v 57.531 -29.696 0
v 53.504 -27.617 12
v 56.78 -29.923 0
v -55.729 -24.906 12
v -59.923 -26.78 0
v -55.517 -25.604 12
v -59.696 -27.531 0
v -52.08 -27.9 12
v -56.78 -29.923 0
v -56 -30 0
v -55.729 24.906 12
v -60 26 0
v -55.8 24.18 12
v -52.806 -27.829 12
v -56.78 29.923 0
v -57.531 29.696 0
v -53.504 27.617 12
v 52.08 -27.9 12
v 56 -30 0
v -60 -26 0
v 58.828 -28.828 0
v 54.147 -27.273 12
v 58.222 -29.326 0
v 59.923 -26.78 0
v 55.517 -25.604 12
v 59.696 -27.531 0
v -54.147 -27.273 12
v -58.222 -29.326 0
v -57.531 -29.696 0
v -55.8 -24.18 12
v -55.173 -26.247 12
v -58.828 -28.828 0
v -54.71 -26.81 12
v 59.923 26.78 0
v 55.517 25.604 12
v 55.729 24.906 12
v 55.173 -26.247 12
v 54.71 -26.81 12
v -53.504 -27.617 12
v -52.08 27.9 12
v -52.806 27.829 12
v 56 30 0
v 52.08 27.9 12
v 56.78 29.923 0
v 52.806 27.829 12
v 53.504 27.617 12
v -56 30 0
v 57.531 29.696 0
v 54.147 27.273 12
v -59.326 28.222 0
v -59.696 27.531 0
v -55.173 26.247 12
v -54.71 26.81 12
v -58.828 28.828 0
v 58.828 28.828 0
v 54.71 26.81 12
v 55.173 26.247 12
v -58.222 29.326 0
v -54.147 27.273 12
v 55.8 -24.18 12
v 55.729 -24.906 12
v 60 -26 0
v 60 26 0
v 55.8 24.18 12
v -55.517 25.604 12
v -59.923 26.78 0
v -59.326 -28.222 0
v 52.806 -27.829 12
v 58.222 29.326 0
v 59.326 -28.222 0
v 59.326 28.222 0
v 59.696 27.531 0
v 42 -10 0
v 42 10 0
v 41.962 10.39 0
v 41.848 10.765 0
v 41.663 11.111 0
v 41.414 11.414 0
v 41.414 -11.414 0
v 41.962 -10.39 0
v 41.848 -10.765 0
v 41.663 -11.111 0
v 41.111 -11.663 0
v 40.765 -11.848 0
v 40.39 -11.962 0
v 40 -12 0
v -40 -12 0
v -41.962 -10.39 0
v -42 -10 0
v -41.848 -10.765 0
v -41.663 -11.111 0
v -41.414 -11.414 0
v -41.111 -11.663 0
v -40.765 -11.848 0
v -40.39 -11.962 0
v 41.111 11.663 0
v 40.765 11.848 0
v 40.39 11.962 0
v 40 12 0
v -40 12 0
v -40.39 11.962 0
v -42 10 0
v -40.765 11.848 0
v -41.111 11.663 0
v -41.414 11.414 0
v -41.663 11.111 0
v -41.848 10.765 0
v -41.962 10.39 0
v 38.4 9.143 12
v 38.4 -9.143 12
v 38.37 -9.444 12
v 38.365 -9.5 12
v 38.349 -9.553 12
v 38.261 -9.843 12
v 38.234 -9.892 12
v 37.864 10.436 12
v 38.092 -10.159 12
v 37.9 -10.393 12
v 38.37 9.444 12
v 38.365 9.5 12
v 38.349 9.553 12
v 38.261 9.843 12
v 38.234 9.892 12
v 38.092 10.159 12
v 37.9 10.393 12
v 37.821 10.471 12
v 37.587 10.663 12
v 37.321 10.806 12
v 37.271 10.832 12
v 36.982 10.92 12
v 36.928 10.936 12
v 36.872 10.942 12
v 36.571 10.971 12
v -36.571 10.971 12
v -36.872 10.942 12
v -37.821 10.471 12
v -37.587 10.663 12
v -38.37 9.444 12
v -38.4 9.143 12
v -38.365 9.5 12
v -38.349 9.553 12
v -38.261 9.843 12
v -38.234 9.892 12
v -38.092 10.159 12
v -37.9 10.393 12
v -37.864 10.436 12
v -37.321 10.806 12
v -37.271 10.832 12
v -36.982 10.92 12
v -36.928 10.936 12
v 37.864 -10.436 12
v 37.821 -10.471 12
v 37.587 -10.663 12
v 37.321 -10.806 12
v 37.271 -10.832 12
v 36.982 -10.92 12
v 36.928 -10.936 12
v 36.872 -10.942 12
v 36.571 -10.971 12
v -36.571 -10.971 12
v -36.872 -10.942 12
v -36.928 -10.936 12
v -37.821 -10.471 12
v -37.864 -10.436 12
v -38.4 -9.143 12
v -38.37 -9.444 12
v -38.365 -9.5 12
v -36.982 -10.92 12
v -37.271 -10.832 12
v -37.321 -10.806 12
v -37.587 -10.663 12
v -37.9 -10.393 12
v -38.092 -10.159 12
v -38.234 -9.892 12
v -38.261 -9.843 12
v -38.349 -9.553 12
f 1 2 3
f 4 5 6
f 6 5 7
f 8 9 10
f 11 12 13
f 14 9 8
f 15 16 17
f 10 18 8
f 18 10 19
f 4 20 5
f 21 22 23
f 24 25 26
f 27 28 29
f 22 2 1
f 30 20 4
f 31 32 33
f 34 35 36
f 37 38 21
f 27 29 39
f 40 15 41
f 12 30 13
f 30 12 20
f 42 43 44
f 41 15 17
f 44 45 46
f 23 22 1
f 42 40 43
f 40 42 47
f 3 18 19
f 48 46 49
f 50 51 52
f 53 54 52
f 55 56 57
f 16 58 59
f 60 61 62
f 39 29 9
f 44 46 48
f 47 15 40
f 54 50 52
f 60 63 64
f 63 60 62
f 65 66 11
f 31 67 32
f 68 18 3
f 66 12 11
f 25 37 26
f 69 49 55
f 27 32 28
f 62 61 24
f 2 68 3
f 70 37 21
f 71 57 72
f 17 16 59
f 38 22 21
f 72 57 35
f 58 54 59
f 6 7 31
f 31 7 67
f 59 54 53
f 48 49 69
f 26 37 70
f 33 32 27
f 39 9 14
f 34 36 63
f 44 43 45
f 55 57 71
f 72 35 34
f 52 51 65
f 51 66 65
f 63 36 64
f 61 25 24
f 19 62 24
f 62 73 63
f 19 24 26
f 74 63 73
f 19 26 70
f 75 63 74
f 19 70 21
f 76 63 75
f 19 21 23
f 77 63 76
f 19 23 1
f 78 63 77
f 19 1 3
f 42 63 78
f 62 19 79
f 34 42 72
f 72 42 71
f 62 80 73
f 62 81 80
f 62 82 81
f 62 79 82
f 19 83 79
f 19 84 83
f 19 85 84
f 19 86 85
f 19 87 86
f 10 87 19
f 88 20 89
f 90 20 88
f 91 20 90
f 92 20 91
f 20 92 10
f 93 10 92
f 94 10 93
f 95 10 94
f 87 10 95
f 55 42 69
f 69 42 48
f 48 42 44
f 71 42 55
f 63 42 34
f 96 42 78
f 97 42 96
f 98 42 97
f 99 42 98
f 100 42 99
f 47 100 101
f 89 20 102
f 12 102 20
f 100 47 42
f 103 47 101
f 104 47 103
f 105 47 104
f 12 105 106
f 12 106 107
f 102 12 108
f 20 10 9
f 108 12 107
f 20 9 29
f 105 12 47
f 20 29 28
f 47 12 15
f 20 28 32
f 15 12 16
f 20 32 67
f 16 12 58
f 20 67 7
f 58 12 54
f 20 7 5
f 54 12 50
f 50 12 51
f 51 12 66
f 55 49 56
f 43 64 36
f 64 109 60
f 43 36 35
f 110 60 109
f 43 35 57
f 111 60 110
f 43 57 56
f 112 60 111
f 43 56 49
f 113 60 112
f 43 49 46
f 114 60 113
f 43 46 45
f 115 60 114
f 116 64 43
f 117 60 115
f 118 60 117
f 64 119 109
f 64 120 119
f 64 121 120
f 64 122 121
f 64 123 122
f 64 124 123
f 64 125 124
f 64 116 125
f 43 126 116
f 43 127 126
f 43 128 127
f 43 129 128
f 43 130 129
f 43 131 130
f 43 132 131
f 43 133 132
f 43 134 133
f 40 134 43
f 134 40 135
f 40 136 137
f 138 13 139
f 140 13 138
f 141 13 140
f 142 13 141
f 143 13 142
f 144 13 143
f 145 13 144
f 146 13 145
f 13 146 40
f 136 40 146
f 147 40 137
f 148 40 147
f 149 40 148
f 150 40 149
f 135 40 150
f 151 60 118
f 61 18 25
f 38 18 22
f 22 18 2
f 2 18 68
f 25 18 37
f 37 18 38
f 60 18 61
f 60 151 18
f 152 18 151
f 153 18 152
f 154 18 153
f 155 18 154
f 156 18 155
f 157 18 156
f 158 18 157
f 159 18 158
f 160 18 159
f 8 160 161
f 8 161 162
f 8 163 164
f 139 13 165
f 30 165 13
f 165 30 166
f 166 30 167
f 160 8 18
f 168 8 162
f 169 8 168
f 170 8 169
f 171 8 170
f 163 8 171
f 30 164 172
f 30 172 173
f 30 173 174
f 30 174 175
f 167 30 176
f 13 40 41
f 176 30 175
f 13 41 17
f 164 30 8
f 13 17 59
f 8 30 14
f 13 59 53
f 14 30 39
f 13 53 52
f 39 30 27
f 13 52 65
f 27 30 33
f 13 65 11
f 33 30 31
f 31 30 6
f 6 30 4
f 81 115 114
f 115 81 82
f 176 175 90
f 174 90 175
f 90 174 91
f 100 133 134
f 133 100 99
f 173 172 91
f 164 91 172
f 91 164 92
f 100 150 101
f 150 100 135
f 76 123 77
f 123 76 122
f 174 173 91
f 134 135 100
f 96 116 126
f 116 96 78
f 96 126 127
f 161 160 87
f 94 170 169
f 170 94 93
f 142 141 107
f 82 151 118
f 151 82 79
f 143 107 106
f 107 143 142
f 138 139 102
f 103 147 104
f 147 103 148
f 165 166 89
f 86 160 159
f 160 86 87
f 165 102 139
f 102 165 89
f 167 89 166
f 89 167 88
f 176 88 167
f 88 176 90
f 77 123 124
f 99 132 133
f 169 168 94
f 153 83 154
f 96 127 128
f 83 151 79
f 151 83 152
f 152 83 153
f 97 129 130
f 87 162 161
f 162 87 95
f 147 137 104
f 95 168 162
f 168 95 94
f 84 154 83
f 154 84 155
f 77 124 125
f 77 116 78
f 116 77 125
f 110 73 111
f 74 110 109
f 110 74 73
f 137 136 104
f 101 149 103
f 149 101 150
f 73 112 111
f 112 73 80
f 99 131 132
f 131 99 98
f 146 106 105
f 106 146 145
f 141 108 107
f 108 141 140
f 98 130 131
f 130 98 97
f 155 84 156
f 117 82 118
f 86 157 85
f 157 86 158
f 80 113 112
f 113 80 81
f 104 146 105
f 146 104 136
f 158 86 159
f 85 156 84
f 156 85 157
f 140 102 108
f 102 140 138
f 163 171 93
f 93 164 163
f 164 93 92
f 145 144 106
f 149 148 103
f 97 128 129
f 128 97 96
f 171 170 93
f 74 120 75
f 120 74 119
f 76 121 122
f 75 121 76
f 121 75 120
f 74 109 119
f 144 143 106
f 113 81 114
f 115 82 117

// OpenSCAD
$fn = 32;

// ----------------------------------------------------------------------
// Display bezel: 120 x 60 mm frame, opening 84x24 mm
// ----------------------------------------------------------------------

// --- parameters (mm) ---
length = 120;             // frame outside length, X
width = 60;               // frame outside width, Y
frame_w = 18;             // frame width
thickness = 12;           // frame thickness
corner_r = 4;             // outside corner radius
chamfer = 0.93;           // outer wall taper
funnel = 0.9;             // inner opening taper
opening_l = 84;           // opening length
opening_w = 24;           // opening width
inner_r = 2;              // opening corner radius

/* rounded-rectangle outlines, generated with loops */
module rounded_ring(l_nom, w_nom, r) {
  hull() {
    for (sx = [-1, 1]) for (sy = [-1, 1])
      translate([sx * (l_nom / 2 - r), sy * (w_nom / 2 - r)]) circle(r = r);
  }
}

difference() {
  /* frame body, drafted so the outer edge is a variable-depth chamfer */
  linear_extrude(height = thickness, scale = chamfer)
    rounded_ring(length, width, corner_r);
  /* viewing opening, drafted the other way for a funnel edge */
  linear_extrude(height = thickness + 2, scale = funnel)
    translate([0, 0, -1]) rounded_ring(opening_l, opening_w, inner_r);
}
